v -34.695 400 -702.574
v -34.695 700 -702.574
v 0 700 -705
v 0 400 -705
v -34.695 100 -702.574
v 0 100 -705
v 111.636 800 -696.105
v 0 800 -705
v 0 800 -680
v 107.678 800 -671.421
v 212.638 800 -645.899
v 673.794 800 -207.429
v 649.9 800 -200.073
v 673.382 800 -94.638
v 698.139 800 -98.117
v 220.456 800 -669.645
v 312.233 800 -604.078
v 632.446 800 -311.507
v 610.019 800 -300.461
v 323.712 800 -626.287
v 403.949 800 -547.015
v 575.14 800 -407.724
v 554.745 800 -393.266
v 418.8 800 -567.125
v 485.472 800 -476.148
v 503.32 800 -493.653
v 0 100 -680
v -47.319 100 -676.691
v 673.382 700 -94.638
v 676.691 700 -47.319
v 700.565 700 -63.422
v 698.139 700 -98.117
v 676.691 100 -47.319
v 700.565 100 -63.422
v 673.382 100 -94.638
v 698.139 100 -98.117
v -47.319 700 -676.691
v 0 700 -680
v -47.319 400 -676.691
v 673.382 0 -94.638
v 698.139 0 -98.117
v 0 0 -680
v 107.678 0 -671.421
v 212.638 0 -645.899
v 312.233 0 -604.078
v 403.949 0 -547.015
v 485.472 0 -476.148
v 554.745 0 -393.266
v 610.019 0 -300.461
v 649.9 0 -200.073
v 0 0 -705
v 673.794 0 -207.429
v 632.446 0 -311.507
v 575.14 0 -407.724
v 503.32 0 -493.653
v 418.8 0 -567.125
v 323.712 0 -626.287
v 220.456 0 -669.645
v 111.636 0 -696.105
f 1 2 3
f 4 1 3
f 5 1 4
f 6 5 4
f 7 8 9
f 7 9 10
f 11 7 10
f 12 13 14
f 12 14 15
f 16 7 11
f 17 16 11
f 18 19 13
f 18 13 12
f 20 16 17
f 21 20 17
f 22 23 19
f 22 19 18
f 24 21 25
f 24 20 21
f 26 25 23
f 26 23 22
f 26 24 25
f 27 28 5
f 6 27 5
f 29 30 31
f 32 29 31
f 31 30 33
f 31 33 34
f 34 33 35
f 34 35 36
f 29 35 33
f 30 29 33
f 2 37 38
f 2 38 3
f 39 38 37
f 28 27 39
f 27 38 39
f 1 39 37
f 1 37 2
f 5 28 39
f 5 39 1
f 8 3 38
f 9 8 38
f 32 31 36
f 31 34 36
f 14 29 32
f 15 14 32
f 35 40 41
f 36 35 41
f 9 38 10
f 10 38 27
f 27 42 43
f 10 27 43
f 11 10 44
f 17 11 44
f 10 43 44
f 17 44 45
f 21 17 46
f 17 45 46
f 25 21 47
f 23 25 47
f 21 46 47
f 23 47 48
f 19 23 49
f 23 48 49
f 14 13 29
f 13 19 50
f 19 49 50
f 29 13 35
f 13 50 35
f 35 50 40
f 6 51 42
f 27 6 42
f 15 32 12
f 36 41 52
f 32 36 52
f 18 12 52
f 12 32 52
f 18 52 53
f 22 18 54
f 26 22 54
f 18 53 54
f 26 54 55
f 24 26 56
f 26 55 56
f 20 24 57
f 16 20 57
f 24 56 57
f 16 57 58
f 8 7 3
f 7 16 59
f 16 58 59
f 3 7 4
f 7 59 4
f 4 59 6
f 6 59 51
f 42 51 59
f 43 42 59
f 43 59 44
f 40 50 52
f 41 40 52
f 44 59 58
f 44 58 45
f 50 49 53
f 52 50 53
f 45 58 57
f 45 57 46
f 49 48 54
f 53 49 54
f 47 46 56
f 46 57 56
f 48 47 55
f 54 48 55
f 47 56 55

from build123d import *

# Parameters (mm, degrees)
EXTRUDE_1_DEPTH       = 800
EXTRUDE_2_DEPTH       = 300
MIRROR_3_COPY_1_DEPTH = 300
MIRROR_3_COPY_2_DEPTH = 300


with BuildPart() as part:
    # 草图1 → 凸台-拉伸1 (new body)
    with BuildSketch(Plane(origin=(0, 0, 0), x_dir=(1, 0, 0), z_dir=(0, 1, 0))):
        with BuildLine():
            Line((0, 705), (0, 680))
            ThreePointArc((0, 680), (446.120139714, 513.202514551), (673.382286744, 94.637708653))
            Line((673.382286744, 94.637708653), (698.138988463, 98.117036177))
            ThreePointArc((698.138988463, 98.117036177), (462.521615438, 532.070254057), (0, 705))
        make_face()
    extrude(amount=EXTRUDE_1_DEPTH)

    # 草图2 → 凸台-拉伸2 (add)
    with BuildSketch(Plane(origin=(0, 400, 0), x_dir=(1, 0, 0), z_dir=(0, 1, 0))):
        Polygon((698.138988463, 98.117036177), (673.382286744, 94.637708653), (676.691143372, 47.318854326), (700.56509889, 63.422040654), align=None)
    extrude_2 = extrude(amount=-EXTRUDE_2_DEPTH)

    # 镜向1: 凸台-拉伸2 across plane
    add(extrude_2.mirror(Plane(origin=(446.120139714, 800, -513.202514551), x_dir=(-0.6560590289905062, 0, 0.754709580222773), z_dir=(-0.7547095802227732, 0, -0.656059028990506))))

    # 镜向2: 凸台-拉伸2 across plane
    add(extrude_2.mirror(Plane.ZX.offset(400)))

    # 镜向3 copy 1 sketch → 镜向3 copy 1 (add)
    with BuildSketch(Plane(origin=(0, 400, 0), x_dir=(-0.13917310096006918, 0, -0.99026806874157), z_dir=(0, -1, 0))):
        Polygon((698.138988463, 98.117036177), (673.382286744, 94.637708653), (676.691143372, 47.318854326), (700.56509889, 63.422040654), align=None)
    extrude(amount=-MIRROR_3_COPY_1_DEPTH)

    # 镜向3 copy 2 sketch → 镜向3 copy 2 (add)
    with BuildSketch(Plane(origin=(0, 400, 0), x_dir=(-0.13917310096006918, 0, -0.99026806874157), z_dir=(0, 1, 0))):
        Polygon((698.138988463, -98.117036177), (673.382286744, -94.637708653), (676.691143372, -47.318854326), (700.56509889, -63.422040654), align=None)
    extrude(amount=-MIRROR_3_COPY_2_DEPTH)


solid = part.part
